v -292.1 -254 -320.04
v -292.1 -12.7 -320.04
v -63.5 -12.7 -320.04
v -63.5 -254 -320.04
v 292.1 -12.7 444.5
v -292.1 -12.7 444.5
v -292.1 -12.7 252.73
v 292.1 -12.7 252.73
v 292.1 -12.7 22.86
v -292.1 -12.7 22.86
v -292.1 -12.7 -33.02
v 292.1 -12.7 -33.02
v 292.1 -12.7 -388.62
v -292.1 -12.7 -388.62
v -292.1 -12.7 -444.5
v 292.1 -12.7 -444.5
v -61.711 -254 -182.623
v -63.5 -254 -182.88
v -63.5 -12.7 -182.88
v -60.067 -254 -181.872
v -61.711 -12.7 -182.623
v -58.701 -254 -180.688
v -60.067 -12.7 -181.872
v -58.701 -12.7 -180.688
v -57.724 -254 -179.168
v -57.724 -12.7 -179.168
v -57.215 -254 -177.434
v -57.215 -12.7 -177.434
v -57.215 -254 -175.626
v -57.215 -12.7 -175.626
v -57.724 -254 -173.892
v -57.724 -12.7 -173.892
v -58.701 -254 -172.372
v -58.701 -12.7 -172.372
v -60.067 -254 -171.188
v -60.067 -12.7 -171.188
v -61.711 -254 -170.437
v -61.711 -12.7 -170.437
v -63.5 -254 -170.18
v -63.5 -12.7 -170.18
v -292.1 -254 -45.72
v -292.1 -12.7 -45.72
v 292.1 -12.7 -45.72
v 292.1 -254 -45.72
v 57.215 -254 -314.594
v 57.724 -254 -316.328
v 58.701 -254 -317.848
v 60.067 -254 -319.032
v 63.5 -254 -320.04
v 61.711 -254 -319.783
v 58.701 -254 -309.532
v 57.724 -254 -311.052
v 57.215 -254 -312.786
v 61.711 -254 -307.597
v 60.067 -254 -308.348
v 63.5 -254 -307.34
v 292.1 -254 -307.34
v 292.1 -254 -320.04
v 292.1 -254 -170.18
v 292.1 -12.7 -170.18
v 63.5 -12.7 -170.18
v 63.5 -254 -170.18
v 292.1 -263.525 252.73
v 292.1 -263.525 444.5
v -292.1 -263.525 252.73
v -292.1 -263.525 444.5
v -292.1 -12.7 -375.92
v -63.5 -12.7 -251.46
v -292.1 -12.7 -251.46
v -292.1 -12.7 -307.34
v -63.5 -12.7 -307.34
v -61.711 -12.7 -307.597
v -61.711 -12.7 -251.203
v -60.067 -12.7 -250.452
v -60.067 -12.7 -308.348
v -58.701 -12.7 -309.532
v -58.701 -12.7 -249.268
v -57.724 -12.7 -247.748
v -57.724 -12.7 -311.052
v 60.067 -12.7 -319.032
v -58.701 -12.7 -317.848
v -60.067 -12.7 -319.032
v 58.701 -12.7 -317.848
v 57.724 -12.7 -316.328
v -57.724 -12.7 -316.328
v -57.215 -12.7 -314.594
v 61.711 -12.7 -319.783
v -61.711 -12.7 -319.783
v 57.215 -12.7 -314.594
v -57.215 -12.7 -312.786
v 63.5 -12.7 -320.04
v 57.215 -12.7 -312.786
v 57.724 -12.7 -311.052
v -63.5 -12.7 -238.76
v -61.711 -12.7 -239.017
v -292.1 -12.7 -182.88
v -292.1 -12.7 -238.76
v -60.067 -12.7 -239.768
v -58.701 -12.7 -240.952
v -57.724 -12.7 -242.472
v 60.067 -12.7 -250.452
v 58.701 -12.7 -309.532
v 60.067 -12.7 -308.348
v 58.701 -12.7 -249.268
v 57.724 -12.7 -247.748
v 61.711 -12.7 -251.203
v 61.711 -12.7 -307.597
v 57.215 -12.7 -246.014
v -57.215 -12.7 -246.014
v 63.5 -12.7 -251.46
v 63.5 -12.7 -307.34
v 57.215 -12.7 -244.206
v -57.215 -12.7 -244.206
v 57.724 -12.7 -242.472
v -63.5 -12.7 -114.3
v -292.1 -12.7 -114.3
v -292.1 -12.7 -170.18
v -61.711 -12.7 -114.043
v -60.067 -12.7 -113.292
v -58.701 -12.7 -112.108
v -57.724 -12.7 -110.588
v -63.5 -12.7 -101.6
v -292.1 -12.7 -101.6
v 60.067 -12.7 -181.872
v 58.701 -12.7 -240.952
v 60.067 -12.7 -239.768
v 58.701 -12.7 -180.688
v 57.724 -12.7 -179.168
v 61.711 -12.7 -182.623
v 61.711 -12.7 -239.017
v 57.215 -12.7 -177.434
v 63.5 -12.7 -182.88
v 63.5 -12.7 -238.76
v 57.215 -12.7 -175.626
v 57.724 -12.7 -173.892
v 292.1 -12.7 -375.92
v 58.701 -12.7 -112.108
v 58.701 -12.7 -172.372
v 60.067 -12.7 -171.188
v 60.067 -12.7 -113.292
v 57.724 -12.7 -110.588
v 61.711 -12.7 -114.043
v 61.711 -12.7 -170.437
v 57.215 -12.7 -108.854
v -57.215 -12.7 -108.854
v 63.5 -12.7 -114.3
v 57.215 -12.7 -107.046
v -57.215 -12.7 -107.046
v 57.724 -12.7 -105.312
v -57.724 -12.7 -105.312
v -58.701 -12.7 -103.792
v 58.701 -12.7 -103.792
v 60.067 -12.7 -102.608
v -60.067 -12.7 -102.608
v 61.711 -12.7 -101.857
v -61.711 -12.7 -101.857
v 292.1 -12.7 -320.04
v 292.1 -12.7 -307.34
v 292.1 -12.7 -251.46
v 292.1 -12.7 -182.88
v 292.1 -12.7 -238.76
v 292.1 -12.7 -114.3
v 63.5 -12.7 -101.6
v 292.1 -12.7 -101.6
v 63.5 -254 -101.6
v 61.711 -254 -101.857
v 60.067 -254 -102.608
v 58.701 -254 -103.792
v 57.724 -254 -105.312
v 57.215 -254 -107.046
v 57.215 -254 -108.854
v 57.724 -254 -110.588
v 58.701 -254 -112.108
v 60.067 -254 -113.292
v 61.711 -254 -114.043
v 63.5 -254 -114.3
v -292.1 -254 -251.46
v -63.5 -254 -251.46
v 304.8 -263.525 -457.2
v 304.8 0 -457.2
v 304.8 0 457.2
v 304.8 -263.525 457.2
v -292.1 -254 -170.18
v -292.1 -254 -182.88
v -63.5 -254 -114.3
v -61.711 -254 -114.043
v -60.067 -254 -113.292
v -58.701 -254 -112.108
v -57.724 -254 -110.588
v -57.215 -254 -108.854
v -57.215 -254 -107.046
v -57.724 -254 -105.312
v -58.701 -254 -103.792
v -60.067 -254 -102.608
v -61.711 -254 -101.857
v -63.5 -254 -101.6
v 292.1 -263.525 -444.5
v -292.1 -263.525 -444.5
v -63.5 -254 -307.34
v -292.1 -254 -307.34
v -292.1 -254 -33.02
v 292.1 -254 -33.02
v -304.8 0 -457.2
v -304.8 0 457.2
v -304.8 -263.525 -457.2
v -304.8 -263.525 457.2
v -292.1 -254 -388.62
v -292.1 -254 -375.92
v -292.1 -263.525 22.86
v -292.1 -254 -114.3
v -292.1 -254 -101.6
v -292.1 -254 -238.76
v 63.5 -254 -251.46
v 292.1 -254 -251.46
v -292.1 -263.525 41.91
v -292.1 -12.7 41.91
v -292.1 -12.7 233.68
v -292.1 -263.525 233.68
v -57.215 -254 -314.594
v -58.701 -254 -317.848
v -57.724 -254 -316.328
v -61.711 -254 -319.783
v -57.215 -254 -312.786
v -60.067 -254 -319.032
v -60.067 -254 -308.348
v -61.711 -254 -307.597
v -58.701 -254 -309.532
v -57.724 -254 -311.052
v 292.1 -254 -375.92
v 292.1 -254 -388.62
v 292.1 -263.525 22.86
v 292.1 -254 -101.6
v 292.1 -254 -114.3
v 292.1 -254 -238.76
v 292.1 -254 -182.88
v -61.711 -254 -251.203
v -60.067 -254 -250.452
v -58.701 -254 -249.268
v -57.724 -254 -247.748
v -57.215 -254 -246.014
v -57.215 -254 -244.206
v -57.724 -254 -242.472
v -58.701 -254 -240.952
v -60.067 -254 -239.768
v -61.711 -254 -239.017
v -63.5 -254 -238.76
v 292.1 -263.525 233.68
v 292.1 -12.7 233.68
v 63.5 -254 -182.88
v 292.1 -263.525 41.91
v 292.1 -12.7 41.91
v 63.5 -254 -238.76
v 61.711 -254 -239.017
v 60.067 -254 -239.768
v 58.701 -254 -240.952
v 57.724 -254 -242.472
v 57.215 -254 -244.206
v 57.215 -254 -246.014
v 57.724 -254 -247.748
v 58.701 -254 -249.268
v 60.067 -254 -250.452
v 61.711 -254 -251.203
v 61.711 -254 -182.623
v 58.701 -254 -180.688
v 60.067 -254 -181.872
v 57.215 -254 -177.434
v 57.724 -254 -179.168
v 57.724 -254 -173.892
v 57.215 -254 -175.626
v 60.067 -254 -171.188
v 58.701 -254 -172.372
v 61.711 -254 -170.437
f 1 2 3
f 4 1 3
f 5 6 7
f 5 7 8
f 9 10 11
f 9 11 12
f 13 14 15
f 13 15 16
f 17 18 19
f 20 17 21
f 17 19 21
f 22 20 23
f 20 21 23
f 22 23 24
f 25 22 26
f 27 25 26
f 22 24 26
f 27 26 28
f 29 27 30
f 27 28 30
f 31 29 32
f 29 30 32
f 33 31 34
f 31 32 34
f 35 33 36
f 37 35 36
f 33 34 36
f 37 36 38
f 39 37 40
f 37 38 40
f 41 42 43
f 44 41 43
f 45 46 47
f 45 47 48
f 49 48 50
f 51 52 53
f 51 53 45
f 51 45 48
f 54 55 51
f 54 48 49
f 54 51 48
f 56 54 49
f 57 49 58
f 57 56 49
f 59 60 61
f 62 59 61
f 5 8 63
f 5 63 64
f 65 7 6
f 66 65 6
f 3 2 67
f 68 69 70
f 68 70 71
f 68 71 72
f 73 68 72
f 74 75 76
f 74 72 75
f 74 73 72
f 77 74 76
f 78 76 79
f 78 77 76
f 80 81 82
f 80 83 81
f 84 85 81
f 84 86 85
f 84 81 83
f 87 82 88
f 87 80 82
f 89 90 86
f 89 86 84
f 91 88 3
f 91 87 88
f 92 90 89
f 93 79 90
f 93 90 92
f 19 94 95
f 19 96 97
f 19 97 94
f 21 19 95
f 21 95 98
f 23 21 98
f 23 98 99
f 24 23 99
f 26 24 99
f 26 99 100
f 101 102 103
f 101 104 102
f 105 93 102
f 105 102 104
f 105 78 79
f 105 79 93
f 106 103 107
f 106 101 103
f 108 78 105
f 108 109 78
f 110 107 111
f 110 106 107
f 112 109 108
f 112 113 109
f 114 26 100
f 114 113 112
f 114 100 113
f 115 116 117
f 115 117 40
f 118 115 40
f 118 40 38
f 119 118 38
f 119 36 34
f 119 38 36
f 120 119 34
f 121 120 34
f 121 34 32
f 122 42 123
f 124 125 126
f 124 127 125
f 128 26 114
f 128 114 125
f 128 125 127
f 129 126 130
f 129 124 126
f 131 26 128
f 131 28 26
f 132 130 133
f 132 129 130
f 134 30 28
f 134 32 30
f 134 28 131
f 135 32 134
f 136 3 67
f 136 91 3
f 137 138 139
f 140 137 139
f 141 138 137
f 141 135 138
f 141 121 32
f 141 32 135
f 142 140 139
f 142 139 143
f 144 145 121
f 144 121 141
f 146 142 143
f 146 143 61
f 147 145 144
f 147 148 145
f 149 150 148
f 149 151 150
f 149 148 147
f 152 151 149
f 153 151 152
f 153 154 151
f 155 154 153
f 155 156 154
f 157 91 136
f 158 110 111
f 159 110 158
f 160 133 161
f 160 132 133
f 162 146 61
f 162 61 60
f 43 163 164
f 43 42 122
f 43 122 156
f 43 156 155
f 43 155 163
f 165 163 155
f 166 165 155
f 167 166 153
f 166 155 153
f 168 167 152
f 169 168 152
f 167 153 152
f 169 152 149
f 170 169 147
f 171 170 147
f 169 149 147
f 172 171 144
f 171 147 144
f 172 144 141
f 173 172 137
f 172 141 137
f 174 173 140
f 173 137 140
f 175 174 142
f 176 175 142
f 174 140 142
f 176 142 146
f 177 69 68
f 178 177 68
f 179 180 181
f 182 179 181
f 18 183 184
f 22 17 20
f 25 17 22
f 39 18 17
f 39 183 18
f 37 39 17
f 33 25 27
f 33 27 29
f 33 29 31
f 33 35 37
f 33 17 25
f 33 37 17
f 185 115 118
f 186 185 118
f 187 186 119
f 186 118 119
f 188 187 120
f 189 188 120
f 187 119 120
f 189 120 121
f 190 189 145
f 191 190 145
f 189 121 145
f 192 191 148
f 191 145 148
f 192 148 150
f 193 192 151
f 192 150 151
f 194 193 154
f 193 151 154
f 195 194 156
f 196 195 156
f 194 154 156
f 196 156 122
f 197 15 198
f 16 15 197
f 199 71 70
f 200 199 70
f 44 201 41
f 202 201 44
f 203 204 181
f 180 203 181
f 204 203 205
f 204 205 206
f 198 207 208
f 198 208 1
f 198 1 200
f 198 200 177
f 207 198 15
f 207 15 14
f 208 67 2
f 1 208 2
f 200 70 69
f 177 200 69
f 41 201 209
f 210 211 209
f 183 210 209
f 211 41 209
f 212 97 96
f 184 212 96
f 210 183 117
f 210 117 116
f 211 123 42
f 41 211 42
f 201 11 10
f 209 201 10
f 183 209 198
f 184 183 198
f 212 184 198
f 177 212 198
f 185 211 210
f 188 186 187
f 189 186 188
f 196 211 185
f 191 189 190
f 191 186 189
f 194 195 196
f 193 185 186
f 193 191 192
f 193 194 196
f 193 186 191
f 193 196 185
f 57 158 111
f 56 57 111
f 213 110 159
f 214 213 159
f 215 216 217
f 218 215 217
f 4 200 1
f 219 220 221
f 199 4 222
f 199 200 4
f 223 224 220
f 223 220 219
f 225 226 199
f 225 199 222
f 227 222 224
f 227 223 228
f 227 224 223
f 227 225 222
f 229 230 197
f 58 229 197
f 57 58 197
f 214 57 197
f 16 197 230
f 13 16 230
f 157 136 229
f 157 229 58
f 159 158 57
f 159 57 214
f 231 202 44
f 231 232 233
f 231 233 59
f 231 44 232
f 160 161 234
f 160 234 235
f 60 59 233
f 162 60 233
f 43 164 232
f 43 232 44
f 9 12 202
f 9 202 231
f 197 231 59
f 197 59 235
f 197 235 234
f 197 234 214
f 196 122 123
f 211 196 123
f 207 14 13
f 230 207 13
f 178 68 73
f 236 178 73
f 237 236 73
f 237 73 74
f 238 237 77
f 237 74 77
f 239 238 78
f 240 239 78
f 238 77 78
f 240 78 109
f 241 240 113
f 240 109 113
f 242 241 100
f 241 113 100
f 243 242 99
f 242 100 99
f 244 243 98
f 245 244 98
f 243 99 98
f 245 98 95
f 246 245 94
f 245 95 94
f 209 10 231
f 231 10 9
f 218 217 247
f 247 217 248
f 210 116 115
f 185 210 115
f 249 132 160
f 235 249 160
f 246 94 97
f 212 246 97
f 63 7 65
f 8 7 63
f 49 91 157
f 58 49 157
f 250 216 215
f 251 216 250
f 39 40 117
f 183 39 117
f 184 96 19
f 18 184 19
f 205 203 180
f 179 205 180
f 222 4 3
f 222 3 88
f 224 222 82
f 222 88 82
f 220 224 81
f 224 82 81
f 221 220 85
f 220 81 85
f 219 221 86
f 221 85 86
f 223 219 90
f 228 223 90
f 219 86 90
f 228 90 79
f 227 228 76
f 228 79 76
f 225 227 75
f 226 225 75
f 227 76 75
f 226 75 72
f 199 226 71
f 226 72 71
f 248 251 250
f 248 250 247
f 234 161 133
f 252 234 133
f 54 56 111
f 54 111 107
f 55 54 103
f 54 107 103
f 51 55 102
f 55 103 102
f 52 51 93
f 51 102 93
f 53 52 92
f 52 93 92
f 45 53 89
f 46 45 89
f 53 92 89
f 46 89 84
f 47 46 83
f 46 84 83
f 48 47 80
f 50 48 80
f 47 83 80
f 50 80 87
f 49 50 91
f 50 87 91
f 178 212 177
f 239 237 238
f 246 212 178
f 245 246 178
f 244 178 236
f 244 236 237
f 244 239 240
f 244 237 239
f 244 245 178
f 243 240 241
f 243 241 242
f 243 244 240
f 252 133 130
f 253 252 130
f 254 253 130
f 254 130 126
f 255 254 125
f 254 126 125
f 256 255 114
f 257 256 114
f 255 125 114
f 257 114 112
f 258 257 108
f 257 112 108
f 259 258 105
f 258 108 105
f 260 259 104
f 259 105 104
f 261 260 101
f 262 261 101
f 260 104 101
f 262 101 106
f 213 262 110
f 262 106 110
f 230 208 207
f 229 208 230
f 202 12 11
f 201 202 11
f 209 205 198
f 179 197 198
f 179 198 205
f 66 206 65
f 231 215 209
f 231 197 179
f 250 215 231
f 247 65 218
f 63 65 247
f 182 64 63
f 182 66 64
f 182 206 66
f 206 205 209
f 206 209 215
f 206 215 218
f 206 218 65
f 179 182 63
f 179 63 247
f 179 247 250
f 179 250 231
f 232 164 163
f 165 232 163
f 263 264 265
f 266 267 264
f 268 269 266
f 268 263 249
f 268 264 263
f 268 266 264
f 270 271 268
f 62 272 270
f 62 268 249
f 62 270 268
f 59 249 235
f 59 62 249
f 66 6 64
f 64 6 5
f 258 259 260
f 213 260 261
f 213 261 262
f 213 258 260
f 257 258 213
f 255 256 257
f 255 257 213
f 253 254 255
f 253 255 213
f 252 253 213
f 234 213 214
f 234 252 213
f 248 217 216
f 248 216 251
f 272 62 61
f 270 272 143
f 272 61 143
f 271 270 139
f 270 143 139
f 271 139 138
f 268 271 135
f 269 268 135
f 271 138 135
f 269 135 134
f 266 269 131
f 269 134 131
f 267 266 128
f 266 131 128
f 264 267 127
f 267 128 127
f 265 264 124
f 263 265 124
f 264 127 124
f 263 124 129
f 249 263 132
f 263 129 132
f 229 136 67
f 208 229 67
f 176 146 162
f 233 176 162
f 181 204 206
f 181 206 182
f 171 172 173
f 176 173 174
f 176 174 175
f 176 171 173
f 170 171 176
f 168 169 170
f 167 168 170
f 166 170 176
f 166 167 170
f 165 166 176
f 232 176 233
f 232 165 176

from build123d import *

# Parameters (mm, degrees)
F0_W     = 609.6
F0_H     = 914.4
F1_DEPTH = 263.525
F2_T     = -12.7
F3_W     = 584.2
F3_H     = 19.05
F4_DEPTH = 250.825
F6_DEPTH = 241.3
F7_DEPTH = 241.3


# Not quite as in the source:
# - a feature names something its author has since deleted; it is built from what else it names


with BuildPart() as f1:
    # F0 (on Front) → F1 (new body)
    with BuildSketch(Plane.XZ):
        Rectangle(F0_W, F0_H)
    extrude(amount=F1_DEPTH)

    # F2
    f2_openings = [f1.faces().sort_by_distance(p)[0] for p in [
        (0, -263.525, 0),
    ]]
    offset(amount=F2_T, openings=f2_openings)

    # F3 (on face) → F4 (join)
    with BuildSketch(Plane.XZ.offset(12.7)):
        with Locations((0, 32.385)):
            Rectangle(F3_W, F3_H)
        with Locations((0, 243.205)):
            Rectangle(F3_W, F3_H)
    extrude(amount=F4_DEPTH)

    # F5 (on face) → F6 (join)
    with BuildSketch(Plane.XZ.offset(12.7)):
        Polygon((-63.5, -33.02), (-292.1, -33.02), (-292.1, -45.72), (-63.5, -45.72), (63.5, -45.72), (292.1, -45.72), (292.1, -33.02), (63.5, -33.02), align=None)
    extrude(amount=F6_DEPTH)

    # F5 (on face) → F7 (join)
    with BuildSketch(Plane.XZ.offset(12.7)):
        with BuildLine():
            Line((292.1, -182.88), (292.1, -170.18))
            Line((292.1, -170.18), (63.5, -170.18))
            ThreePointArc((63.5, -170.18), (57.15, -176.53), (63.5, -182.88))
            Line((63.5, -182.88), (292.1, -182.88))
        make_face()
        with BuildLine():
            Line((292.1, -114.3), (292.1, -101.6))
            Line((292.1, -101.6), (63.5, -101.6))
            ThreePointArc((63.5, -101.6), (57.15, -107.95), (63.5, -114.3))
            Line((63.5, -114.3), (292.1, -114.3))
        make_face()
        Polygon((-63.5, -33.02), (-292.1, -33.02), (-292.1, -45.72), (-63.5, -45.72), (63.5, -45.72), (292.1, -45.72), (292.1, -33.02), (63.5, -33.02), align=None)
        with BuildLine():
            Line((-63.5, -170.18), (-292.1, -170.18))
            Line((-292.1, -170.18), (-292.1, -182.88))
            Line((-292.1, -182.88), (-63.5, -182.88))
            ThreePointArc((-63.5, -182.88), (-57.15, -176.53), (-63.5, -170.18))
        make_face()
        with BuildLine():
            Line((-63.5, -101.6), (-292.1, -101.6))
            Line((-292.1, -101.6), (-292.1, -114.3))
            Line((-292.1, -114.3), (-63.5, -114.3))
            ThreePointArc((-63.5, -114.3), (-57.15, -107.95), (-63.5, -101.6))
        make_face()
        with BuildLine():
            Line((-63.5, -238.76), (-292.1, -238.76))
            Line((-292.1, -238.76), (-292.1, -251.46))
            Line((-292.1, -251.46), (-63.5, -251.46))
            ThreePointArc((-63.5, -251.46), (-57.15, -245.11), (-63.5, -238.76))
        make_face()
        with BuildLine():
            Line((292.1, -251.46), (292.1, -238.76))
            Line((292.1, -238.76), (63.5, -238.76))
            ThreePointArc((63.5, -238.76), (57.15, -245.11), (63.5, -251.46))
            Line((63.5, -251.46), (292.1, -251.46))
        make_face()
        with BuildLine():
            Line((292.1, -320.04), (292.1, -307.34))
            Line((292.1, -307.34), (63.5, -307.34))
            ThreePointArc((63.5, -307.34), (57.15, -313.69), (63.5, -320.04))
            Line((63.5, -320.04), (292.1, -320.04))
        make_face()
        with BuildLine():
            Line((-63.5, -307.34), (-292.1, -307.34))
            Line((-292.1, -307.34), (-292.1, -320.04))
            Line((-292.1, -320.04), (-63.5, -320.04))
            ThreePointArc((-63.5, -320.04), (-57.15, -313.69), (-63.5, -307.34))
        make_face()
        Polygon((-63.5, -375.92), (-292.1, -375.92), (-292.1, -388.62), (-63.5, -388.62), (63.5, -388.62), (292.1, -388.62), (292.1, -375.92), (63.5, -375.92), align=None)
    extrude(amount=F7_DEPTH)


solid = f1.part
